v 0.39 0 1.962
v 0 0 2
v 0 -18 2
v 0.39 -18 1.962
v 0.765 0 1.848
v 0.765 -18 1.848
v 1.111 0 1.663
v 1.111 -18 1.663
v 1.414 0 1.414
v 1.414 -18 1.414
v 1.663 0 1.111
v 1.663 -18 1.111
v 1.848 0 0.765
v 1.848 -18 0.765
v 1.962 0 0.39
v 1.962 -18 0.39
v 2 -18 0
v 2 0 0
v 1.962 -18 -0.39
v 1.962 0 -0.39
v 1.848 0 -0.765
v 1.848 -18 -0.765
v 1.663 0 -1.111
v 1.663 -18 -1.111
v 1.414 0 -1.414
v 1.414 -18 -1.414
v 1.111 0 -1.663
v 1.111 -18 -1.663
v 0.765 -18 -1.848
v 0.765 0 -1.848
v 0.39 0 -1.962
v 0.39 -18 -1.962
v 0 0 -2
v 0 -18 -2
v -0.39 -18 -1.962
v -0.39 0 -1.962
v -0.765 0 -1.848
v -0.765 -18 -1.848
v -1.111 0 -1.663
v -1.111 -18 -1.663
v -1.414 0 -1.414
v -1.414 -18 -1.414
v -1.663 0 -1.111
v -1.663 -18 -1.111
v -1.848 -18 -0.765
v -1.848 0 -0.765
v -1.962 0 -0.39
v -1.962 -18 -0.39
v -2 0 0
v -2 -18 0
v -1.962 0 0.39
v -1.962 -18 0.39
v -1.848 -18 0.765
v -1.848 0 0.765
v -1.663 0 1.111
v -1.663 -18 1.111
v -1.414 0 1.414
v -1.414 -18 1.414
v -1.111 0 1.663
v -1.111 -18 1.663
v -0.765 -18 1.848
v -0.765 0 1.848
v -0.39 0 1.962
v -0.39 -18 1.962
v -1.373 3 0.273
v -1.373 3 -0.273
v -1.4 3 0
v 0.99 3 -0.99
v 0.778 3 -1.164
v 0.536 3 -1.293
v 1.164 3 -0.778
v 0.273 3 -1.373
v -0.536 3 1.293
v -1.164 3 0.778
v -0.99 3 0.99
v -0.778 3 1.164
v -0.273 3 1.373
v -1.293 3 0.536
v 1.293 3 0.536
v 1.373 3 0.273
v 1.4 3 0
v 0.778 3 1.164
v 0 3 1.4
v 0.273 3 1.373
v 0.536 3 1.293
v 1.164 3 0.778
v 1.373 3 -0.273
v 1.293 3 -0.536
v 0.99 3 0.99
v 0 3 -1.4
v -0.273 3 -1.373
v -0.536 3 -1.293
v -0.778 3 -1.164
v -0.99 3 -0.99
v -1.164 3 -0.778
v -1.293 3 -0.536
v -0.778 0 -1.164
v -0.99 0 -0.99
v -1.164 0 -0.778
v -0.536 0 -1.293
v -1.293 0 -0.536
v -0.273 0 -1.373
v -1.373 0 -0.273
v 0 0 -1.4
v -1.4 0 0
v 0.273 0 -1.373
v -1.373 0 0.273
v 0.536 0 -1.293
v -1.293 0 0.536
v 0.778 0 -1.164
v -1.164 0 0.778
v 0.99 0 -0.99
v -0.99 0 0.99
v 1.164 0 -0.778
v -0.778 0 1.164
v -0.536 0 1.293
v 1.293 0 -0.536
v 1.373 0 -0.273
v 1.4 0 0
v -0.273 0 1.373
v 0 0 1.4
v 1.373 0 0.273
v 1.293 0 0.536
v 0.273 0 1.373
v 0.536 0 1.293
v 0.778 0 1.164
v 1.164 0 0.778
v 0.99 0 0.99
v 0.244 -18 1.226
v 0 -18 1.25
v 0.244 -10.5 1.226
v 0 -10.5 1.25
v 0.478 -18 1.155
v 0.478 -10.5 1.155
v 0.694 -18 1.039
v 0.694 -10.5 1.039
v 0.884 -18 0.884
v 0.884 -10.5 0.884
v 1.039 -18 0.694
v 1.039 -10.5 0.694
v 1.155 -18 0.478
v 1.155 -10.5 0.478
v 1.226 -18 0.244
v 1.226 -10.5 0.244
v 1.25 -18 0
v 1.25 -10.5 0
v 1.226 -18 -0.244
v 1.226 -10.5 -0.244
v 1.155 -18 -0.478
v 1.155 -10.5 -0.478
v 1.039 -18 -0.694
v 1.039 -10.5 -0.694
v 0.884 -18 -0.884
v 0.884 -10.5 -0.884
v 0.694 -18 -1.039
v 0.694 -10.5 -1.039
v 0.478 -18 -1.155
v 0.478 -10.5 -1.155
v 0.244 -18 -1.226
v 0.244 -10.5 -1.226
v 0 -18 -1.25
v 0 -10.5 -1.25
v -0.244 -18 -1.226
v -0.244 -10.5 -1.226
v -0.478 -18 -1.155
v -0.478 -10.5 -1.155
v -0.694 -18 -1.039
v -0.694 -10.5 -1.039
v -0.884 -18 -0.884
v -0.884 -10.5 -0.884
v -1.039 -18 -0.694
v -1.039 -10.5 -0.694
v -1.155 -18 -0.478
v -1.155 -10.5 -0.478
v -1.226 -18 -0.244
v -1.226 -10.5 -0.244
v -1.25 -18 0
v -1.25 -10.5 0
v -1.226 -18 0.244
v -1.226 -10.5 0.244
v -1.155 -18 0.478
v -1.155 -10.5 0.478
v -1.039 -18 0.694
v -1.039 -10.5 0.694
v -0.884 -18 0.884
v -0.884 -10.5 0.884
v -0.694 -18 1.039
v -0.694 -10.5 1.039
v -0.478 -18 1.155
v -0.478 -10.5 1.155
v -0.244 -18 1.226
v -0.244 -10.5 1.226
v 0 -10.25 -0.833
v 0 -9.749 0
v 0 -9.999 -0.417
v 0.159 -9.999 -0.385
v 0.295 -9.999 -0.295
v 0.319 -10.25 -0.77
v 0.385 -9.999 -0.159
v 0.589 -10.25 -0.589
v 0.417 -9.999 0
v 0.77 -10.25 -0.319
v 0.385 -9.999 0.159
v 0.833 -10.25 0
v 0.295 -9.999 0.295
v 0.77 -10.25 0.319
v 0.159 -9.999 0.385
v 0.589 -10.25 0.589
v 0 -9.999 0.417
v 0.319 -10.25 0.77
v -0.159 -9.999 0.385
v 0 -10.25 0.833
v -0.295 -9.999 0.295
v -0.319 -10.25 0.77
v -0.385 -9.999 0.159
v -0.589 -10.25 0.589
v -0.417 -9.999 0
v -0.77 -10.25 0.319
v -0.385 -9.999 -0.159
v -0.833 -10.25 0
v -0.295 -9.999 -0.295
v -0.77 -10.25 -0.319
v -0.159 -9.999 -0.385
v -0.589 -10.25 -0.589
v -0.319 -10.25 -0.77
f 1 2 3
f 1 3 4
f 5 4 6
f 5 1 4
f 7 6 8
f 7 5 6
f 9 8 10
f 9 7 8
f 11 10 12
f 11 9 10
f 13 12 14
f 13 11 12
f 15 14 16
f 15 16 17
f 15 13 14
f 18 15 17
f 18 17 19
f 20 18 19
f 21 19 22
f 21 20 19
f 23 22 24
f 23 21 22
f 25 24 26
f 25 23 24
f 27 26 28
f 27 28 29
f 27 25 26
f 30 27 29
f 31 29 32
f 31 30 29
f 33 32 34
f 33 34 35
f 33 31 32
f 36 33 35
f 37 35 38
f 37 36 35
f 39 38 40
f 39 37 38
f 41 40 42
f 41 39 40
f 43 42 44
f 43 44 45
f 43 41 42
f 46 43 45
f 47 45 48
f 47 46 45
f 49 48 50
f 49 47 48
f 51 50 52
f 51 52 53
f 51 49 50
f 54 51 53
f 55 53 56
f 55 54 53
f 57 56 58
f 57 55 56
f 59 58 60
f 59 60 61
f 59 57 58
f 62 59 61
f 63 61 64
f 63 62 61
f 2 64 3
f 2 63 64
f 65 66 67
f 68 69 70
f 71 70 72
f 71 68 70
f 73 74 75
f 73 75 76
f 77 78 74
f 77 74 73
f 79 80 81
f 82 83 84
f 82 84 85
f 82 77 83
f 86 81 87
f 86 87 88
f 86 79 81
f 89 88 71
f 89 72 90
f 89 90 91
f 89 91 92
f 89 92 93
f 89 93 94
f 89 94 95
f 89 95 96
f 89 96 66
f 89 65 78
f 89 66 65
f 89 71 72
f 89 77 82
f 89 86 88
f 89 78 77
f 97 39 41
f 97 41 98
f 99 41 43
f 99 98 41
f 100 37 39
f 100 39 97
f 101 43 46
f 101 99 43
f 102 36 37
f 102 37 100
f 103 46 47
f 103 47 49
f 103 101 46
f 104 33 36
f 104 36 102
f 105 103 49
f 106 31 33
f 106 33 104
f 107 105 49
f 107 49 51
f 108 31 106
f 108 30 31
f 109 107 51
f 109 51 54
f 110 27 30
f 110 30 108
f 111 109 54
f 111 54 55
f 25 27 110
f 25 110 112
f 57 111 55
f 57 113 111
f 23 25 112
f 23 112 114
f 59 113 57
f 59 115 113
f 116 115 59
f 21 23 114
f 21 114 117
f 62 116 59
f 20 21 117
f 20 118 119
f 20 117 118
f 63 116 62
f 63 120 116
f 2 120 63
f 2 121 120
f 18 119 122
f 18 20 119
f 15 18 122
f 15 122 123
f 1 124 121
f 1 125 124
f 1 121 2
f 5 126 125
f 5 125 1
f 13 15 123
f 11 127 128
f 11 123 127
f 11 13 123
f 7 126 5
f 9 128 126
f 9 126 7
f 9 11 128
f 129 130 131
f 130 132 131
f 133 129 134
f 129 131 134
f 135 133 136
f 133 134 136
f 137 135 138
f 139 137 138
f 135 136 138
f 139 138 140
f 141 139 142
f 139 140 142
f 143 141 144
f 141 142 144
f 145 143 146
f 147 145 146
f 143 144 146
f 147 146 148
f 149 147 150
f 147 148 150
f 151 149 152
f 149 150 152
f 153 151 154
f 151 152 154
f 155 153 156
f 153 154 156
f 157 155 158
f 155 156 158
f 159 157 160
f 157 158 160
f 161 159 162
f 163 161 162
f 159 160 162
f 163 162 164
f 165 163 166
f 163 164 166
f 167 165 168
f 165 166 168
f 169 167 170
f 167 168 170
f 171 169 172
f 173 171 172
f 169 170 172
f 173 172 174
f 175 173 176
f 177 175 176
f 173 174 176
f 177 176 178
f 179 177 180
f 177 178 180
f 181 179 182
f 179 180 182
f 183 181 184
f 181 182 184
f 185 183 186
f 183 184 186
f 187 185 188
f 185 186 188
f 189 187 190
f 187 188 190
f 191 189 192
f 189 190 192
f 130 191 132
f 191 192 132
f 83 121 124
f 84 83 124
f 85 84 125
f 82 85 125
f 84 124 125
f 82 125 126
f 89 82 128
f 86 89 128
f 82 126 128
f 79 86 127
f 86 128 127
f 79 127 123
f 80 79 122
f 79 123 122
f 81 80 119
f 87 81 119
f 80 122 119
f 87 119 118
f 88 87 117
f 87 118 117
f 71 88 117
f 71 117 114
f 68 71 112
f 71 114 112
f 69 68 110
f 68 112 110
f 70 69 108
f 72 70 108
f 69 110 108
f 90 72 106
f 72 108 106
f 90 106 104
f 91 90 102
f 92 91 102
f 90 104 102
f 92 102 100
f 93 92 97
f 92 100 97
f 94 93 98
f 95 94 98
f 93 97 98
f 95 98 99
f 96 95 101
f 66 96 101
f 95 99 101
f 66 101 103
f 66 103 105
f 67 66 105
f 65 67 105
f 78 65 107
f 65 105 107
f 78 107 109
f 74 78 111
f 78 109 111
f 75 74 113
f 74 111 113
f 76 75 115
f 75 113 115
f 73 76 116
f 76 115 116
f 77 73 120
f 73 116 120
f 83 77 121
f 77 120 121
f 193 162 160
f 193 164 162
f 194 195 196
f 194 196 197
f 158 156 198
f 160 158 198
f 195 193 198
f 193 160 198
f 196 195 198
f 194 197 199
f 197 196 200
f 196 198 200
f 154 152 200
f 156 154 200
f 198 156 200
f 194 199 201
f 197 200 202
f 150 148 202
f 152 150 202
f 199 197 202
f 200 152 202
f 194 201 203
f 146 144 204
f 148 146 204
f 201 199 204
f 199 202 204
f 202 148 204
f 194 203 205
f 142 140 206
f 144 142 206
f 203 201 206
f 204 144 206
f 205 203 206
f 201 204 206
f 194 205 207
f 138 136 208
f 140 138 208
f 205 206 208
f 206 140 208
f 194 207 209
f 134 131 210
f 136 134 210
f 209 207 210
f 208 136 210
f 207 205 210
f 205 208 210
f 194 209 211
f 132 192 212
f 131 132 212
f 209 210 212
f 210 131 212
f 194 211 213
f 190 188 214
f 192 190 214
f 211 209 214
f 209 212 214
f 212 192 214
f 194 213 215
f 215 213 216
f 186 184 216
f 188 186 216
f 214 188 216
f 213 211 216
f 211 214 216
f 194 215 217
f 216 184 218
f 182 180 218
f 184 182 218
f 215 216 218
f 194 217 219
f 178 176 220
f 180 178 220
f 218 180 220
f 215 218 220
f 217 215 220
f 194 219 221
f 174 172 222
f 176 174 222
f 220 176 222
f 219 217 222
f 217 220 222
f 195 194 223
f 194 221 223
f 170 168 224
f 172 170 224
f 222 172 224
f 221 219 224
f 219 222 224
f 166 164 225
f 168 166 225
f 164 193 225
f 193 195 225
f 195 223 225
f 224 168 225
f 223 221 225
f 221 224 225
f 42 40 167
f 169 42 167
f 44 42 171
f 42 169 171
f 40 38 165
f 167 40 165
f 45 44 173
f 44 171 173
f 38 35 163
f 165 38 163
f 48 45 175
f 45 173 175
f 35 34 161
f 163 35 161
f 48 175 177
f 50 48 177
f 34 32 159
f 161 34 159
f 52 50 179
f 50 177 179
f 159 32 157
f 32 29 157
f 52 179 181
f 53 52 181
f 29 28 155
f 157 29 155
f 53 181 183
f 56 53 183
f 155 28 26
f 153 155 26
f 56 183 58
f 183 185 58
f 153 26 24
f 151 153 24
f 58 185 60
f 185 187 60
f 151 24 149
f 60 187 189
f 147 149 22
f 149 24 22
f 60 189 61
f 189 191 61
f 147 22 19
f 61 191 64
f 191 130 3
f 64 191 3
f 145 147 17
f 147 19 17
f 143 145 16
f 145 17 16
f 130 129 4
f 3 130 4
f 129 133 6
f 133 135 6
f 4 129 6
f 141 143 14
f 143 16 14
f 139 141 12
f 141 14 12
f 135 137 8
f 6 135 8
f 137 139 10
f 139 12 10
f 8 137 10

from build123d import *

# Parameters (mm, degrees)
SKETCH_1_R             = 2
EXTRUDE_1_DEPTH        = 18
SKETCH_2_R             = 1.4
EXTRUDE_2_DEPTH        = 3
HOLE_WIZARD_M3_1_D     = 2.5
HOLE_WIZARD_M3_1_DEPTH = 7.5
HOLE_WIZARD_M3_1_TIP   = 0.751075774


with BuildPart() as part:
    # 草图1 → 凸台-拉伸1 (new body)
    with BuildSketch(Plane(origin=(0, 0, 0), x_dir=(1, 0, 0), z_dir=(0, 1, 0))):
        with Locations(Location((0, 0, 0), (0, 0, 270))):
            Circle(SKETCH_1_R)
    extrude(amount=-EXTRUDE_1_DEPTH)

    # 草图2 → 凸台-拉伸2 (add)
    with BuildSketch(Plane(origin=(0, 0, 0), x_dir=(1, 0, 0), z_dir=(0, 1, 0))):
        with Locations(Location((0, 0, 0), (0, 0, 270))):
            Circle(SKETCH_2_R)
    extrude(amount=EXTRUDE_2_DEPTH)

    # M3 螺纹孔1
    with Locations(Plane(origin=(0, -18, 0), x_dir=(0, 0, -1), z_dir=(0, -1, 0))):
        with Locations((0, 0)):
            Hole(HOLE_WIZARD_M3_1_D / 2, depth=HOLE_WIZARD_M3_1_DEPTH)
            with Locations((0, 0, -(HOLE_WIZARD_M3_1_DEPTH + HOLE_WIZARD_M3_1_TIP / 2))):  # 118° drill point
                Cone(0, HOLE_WIZARD_M3_1_D / 2, HOLE_WIZARD_M3_1_TIP, mode=Mode.SUBTRACT)


solid = part.part
